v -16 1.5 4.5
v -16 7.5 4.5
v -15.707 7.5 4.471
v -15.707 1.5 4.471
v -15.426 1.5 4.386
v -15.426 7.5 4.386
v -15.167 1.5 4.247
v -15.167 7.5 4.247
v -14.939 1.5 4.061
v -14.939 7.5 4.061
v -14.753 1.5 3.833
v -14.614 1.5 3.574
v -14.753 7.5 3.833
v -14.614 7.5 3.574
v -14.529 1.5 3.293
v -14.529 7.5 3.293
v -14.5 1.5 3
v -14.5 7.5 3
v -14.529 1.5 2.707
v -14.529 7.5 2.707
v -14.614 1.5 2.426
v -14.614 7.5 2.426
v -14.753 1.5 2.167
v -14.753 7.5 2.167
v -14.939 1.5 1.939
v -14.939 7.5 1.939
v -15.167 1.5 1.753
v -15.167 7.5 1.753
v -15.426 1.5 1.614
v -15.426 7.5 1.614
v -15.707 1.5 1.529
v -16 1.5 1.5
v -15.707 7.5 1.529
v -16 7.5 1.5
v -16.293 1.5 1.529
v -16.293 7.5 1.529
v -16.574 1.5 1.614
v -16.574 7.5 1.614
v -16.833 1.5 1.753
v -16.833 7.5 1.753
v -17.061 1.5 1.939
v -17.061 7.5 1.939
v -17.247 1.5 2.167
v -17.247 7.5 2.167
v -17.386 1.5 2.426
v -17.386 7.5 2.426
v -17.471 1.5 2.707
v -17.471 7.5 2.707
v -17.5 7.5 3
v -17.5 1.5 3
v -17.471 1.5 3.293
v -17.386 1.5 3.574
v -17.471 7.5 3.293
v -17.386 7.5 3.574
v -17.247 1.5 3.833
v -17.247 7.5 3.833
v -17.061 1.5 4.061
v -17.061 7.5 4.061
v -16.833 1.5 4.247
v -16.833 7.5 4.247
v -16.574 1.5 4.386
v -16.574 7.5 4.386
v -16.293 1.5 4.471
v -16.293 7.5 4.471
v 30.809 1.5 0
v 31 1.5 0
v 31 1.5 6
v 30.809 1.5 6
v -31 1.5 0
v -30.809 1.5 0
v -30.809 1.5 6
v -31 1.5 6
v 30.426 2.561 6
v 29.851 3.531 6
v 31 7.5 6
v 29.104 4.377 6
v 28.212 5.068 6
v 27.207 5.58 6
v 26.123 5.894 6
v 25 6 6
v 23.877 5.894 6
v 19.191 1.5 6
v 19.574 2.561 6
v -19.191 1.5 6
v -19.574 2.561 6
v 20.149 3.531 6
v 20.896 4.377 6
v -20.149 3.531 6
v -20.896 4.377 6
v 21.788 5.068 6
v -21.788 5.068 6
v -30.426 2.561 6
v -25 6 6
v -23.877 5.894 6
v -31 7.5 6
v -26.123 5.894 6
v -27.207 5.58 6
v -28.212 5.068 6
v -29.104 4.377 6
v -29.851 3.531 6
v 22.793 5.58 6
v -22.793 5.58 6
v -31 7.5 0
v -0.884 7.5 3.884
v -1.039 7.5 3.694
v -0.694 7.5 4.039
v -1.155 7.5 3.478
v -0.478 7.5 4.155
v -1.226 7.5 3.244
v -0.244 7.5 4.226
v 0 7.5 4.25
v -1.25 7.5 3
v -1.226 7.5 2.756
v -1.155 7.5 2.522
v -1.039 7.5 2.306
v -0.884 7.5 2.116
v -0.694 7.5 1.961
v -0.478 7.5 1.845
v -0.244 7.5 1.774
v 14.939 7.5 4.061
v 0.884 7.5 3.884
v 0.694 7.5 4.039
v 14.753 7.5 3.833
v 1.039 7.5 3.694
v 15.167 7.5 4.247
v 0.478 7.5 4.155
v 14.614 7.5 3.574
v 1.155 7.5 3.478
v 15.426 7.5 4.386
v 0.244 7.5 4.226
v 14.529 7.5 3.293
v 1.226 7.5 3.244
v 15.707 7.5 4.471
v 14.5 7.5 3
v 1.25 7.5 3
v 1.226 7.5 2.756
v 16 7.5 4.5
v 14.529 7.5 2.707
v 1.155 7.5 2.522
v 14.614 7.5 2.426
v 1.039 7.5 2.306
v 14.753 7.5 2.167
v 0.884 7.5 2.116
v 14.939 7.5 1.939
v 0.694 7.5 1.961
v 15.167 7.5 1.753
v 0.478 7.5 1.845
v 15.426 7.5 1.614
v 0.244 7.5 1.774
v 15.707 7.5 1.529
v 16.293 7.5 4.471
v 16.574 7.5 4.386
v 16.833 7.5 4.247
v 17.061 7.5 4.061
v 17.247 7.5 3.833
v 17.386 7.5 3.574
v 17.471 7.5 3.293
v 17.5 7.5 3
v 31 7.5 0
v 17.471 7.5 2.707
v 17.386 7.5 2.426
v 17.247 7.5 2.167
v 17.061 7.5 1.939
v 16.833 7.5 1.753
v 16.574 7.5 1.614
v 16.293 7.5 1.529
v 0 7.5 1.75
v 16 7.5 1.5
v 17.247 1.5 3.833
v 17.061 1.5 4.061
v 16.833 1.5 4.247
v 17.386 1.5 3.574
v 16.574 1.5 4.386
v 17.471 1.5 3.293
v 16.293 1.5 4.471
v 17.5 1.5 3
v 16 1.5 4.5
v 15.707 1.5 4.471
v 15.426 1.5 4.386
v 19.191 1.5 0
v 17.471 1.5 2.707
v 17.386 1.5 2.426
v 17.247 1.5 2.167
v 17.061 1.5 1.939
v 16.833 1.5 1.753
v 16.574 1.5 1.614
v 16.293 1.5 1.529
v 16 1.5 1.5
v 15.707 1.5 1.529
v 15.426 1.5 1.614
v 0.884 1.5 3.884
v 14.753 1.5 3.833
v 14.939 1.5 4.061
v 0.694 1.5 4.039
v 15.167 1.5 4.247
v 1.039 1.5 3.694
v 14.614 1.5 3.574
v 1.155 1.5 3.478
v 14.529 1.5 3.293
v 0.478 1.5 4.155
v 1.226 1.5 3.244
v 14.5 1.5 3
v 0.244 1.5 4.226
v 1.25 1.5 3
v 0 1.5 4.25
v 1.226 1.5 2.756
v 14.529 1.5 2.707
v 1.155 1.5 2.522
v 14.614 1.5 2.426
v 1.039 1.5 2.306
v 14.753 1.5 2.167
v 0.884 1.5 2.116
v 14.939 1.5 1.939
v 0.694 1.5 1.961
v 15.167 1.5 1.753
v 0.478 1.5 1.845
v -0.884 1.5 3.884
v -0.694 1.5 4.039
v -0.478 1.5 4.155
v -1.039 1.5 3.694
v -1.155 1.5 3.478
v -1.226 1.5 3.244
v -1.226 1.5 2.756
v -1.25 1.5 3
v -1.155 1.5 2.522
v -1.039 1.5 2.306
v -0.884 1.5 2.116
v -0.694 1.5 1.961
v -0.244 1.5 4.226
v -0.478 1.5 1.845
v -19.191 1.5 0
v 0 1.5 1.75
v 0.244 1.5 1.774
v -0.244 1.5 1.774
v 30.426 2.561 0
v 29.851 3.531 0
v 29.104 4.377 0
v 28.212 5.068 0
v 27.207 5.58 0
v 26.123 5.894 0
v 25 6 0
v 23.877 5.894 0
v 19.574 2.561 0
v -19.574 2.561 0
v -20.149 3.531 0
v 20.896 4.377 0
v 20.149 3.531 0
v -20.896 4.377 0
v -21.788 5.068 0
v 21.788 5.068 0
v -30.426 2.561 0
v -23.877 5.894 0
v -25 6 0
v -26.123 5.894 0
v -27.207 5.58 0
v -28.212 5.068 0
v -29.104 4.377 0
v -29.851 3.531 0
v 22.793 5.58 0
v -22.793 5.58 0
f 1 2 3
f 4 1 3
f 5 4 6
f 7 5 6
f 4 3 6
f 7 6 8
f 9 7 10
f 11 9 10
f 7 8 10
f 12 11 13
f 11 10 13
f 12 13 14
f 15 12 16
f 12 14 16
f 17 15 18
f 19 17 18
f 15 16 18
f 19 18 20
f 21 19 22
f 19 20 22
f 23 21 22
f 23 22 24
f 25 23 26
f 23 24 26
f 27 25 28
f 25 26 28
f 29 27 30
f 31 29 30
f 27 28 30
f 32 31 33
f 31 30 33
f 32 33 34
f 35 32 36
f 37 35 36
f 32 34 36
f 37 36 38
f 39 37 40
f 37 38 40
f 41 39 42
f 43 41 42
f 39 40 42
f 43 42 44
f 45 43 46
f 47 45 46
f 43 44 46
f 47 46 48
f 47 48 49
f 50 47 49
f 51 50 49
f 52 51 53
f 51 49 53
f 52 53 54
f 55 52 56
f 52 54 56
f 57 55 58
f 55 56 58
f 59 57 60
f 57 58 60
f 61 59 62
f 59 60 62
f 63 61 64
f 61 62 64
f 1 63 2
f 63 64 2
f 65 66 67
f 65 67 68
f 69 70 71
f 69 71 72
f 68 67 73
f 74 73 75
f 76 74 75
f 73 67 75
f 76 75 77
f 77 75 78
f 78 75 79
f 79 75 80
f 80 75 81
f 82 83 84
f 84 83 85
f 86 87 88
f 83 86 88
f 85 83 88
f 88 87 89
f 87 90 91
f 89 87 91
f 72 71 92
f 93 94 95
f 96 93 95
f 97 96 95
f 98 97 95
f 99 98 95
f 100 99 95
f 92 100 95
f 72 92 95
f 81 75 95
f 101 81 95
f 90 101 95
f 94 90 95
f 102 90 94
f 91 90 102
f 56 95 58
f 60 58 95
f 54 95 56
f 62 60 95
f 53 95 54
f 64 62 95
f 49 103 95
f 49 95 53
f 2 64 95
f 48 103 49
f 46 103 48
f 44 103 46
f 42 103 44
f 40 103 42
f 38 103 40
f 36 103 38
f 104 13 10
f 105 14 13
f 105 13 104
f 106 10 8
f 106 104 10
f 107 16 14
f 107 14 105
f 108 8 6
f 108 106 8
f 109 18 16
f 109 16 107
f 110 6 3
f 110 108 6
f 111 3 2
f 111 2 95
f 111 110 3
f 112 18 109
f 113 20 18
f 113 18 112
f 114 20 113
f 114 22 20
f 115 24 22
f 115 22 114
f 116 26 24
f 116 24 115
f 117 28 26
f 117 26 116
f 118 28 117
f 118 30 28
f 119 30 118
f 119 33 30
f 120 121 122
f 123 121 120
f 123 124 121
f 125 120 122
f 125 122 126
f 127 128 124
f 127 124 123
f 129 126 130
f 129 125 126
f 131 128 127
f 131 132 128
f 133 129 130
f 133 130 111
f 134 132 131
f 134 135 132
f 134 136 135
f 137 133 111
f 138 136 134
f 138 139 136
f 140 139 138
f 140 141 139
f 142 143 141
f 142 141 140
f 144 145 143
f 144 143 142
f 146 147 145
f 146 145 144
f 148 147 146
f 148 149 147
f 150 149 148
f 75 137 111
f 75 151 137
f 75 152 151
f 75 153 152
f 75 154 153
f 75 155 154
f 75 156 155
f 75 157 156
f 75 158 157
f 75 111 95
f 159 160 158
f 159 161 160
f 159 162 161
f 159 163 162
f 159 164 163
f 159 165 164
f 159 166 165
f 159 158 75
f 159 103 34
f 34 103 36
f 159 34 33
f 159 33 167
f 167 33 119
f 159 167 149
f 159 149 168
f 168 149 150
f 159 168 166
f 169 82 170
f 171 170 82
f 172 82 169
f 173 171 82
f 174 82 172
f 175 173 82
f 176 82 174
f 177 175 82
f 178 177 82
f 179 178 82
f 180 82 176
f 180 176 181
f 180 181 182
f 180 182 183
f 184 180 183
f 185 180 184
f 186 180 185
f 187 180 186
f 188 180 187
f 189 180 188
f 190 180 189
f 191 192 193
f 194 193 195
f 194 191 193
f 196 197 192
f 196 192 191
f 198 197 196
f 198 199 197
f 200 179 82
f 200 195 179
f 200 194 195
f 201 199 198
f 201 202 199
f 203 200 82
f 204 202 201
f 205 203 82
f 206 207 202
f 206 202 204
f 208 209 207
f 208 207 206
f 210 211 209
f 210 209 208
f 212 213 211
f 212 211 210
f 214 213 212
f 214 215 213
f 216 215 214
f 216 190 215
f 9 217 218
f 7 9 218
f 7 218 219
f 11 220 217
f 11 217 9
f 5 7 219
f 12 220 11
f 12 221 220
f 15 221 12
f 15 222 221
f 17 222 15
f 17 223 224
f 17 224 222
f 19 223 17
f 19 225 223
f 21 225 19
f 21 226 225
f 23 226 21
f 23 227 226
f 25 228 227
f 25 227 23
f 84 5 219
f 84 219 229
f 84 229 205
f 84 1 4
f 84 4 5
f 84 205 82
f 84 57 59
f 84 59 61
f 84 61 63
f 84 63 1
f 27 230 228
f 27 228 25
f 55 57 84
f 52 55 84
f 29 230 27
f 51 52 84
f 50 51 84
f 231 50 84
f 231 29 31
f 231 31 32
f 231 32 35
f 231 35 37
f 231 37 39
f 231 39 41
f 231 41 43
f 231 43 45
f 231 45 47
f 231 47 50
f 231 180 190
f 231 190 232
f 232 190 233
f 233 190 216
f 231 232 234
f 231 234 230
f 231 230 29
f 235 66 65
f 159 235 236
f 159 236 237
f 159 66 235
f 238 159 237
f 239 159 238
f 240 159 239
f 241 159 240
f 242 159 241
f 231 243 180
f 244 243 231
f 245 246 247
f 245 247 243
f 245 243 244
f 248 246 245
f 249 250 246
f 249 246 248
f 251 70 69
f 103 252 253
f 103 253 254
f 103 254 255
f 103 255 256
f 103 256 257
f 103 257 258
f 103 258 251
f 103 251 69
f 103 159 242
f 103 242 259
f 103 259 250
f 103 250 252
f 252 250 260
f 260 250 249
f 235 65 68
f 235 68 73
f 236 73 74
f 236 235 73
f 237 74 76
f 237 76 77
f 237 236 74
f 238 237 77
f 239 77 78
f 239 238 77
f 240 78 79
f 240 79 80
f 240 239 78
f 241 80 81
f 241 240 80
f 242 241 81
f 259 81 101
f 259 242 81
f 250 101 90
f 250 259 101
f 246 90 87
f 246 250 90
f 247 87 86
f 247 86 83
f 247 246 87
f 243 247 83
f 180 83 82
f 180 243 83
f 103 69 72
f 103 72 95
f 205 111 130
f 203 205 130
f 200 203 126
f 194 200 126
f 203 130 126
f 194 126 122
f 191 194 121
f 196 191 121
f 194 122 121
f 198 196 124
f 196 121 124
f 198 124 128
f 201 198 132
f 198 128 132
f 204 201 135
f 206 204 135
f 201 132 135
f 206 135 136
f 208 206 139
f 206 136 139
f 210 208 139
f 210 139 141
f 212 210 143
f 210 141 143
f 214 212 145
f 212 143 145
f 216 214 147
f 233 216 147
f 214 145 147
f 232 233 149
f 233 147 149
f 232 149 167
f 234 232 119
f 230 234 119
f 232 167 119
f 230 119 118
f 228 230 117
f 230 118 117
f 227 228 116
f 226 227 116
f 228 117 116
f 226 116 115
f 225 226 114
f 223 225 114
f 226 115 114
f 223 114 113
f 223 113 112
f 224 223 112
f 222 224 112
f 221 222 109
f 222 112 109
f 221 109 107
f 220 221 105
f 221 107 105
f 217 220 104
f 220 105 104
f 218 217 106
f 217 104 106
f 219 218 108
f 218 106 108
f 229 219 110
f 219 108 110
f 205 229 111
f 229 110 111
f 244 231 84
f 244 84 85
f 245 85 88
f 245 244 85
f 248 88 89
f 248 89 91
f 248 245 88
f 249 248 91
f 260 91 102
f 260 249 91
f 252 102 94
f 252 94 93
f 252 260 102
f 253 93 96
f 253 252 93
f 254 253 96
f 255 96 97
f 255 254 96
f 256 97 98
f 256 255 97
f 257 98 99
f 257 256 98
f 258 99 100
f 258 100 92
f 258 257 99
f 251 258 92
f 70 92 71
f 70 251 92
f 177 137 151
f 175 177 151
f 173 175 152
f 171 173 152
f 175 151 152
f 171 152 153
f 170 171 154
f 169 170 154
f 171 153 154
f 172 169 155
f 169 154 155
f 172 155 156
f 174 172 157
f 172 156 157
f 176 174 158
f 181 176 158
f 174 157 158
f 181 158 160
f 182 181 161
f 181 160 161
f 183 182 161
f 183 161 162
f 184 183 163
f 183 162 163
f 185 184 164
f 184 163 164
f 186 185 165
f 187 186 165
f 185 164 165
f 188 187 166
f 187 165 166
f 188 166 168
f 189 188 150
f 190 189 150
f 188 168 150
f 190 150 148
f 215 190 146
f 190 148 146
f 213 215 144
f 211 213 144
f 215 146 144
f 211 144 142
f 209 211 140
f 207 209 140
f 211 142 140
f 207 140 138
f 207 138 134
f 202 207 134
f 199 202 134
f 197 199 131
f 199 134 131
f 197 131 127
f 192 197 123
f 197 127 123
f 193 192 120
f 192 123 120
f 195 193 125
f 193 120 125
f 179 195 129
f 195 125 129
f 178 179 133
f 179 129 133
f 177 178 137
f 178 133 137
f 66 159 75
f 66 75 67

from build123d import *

# Parameters (mm, degrees)
BOSS_EXTRU_1_DEPTH      = 6
ESQUISSE2_R             = 1.5
ESQUISSE2_R_2           = 1.25
ENL_V_MAT_EXTRU_1_DEPTH = 6


with BuildPart() as part:
    # Esquisse1 → Boss.-Extru.1 (new body)
    with BuildSketch(Plane.XY):
        with BuildLine():
            Line((-31, 1.5), (-31, 7.5))
            Line((-31, 7.5), (31, 7.5))
            Line((31, 7.5), (31, 1.5))
            Line((31, 1.5), (30.809475019, 1.5))
            ThreePointArc((30.809475019, 1.5), (25, 6), (19.190524981, 1.5))
            Line((19.190524981, 1.5), (-19.190524981, 1.5))
            ThreePointArc((-19.190524981, 1.5), (-25, 6), (-30.809475019, 1.5))
            Line((-30.809475019, 1.5), (-31, 1.5))
        make_face()
    extrude(amount=BOSS_EXTRU_1_DEPTH)

    # Esquisse2 → Enlèv. mat.-Extru.1 (cut)
    with BuildSketch(Plane(origin=(0, 7.5, 0), x_dir=(1, 0, 0), z_dir=(0, 1, 0))):
        with Locations(Location((-16, -3, 0), (0, 0, 270))):
            Circle(ESQUISSE2_R)
        with Locations(Location((16, -3, 0), (0, 0, 270))):
            Circle(ESQUISSE2_R)
        with Locations(Location((0, -3, 0), (0, 0, 270))):
            Circle(ESQUISSE2_R_2)
    extrude(amount=-ENL_V_MAT_EXTRU_1_DEPTH, mode=Mode.SUBTRACT)


solid = part.part
